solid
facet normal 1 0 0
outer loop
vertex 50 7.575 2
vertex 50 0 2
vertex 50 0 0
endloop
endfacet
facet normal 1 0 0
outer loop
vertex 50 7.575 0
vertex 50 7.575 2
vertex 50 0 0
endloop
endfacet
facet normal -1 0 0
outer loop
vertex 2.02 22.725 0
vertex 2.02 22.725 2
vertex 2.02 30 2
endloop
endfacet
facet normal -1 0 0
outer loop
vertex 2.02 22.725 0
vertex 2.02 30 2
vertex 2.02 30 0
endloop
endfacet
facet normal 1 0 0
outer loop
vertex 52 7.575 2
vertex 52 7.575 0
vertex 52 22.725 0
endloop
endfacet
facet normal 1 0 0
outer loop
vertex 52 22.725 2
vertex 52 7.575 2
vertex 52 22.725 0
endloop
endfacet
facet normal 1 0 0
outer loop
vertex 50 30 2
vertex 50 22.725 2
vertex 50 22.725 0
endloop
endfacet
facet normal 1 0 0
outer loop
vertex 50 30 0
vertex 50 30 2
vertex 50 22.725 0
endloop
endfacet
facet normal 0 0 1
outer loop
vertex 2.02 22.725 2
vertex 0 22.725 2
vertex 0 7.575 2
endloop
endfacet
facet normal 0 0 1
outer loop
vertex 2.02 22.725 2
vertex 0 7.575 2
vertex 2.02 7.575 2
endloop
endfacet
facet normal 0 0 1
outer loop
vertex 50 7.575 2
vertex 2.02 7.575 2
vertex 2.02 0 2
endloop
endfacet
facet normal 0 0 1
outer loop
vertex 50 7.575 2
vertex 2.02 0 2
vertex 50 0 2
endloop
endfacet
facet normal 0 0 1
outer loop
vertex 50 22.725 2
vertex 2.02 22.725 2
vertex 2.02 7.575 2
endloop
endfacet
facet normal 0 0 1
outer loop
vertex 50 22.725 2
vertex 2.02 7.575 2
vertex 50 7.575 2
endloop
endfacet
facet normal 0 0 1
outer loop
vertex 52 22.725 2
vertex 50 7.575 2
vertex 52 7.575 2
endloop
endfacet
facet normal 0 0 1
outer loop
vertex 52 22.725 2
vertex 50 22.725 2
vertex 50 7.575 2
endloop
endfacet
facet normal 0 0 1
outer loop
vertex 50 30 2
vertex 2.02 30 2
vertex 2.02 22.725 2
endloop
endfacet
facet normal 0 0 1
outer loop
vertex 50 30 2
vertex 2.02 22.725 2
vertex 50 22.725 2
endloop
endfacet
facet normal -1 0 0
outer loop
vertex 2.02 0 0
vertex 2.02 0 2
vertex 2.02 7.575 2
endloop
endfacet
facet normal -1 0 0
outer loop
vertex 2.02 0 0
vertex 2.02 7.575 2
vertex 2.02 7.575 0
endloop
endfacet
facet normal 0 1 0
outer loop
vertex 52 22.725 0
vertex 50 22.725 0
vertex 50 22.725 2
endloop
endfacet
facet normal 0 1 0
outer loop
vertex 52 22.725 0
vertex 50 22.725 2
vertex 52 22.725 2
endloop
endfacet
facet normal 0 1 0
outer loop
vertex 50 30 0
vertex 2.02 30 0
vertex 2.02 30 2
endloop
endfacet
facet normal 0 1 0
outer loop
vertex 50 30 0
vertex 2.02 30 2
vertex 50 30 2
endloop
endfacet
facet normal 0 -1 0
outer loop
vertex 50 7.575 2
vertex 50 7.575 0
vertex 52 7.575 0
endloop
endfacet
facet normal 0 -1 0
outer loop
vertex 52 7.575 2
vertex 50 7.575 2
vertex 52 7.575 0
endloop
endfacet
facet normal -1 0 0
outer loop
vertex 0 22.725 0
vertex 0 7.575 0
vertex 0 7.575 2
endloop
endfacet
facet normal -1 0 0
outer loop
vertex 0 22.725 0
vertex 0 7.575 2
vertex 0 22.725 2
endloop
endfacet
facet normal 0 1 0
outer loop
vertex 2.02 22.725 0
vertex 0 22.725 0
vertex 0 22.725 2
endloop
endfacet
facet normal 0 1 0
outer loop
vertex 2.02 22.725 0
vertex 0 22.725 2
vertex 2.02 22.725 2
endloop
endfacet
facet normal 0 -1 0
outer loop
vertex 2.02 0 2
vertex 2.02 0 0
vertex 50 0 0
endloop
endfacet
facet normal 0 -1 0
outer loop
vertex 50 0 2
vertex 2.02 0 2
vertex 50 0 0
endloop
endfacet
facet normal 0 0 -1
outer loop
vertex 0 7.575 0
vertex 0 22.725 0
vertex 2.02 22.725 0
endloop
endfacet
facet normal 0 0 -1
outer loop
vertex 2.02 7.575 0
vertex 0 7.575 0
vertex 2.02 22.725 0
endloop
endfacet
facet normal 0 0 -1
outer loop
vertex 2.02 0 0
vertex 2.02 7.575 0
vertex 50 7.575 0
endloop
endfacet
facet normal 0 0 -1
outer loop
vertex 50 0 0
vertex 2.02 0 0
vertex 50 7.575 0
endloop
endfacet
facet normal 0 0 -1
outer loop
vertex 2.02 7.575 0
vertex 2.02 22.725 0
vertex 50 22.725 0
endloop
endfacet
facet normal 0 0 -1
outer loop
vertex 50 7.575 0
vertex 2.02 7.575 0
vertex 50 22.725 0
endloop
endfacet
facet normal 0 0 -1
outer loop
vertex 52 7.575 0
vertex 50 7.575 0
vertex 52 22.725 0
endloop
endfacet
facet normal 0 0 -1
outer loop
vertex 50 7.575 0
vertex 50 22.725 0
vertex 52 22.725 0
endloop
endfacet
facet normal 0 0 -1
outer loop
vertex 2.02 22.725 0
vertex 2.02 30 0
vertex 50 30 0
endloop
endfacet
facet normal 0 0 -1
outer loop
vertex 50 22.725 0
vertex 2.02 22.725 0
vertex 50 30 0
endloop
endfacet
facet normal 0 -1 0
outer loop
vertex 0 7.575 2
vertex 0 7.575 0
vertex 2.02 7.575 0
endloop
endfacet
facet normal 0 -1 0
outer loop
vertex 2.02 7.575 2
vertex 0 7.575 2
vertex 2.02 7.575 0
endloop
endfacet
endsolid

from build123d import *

# Parameters (mm, degrees)
ESQUISSE1_W              = 52
ESQUISSE1_H              = 30
BOSS_EXTRU_1_DEPTH       = 2
EMPREINTE2_OUTLINE_W     = 2
EMPREINTE2_OUTLINE_H     = 2
EMPREINTE2_OUTLINE_W_2   = 2.02
EMPREINTE2_DEPTH         = 7.575
EMPREINTE2_START         = 22.725
EMPREINTE2_2_OUTLINE_W   = 2
EMPREINTE2_2_OUTLINE_H   = 2
EMPREINTE2_2_OUTLINE_W_2 = 2.02
EMPREINTE2_2_DEPTH       = 7.275


# Read off the part's stored shape, not the designer's step: Empreinte2
with BuildPart() as part:
    # Esquisse1 → Boss.-Extru.1 (new body)
    with BuildSketch(Plane.XY):
        with Locations((26, 15)):
            Rectangle(ESQUISSE1_W, ESQUISSE1_H)
    extrude(amount=BOSS_EXTRU_1_DEPTH)

    # Empreinte2 outline → Empreinte2 (cut)
    with BuildSketch(Plane(origin=(0, 0, 0), x_dir=(1, 0, 0), z_dir=(0, 1, 0))):
        with Locations((51, -1)):
            Rectangle(EMPREINTE2_OUTLINE_W, EMPREINTE2_OUTLINE_H)
        with Locations((1.01, -1)):
            Rectangle(EMPREINTE2_OUTLINE_W_2, EMPREINTE2_OUTLINE_H)
    extrude(amount=EMPREINTE2_DEPTH, mode=Mode.SUBTRACT)

    # Empreinte2 2 outline → Empreinte2 2 (cut)
    with BuildSketch(Plane(origin=(0, 0, 0), x_dir=(1, 0, 0), z_dir=(0, 1, 0)).offset(EMPREINTE2_START)):
        with Locations((51, -1)):
            Rectangle(EMPREINTE2_2_OUTLINE_W, EMPREINTE2_2_OUTLINE_H)
        with Locations((1.01, -1)):
            Rectangle(EMPREINTE2_2_OUTLINE_W_2, EMPREINTE2_2_OUTLINE_H)
    extrude(amount=EMPREINTE2_2_DEPTH, mode=Mode.SUBTRACT)


solid = part.part
